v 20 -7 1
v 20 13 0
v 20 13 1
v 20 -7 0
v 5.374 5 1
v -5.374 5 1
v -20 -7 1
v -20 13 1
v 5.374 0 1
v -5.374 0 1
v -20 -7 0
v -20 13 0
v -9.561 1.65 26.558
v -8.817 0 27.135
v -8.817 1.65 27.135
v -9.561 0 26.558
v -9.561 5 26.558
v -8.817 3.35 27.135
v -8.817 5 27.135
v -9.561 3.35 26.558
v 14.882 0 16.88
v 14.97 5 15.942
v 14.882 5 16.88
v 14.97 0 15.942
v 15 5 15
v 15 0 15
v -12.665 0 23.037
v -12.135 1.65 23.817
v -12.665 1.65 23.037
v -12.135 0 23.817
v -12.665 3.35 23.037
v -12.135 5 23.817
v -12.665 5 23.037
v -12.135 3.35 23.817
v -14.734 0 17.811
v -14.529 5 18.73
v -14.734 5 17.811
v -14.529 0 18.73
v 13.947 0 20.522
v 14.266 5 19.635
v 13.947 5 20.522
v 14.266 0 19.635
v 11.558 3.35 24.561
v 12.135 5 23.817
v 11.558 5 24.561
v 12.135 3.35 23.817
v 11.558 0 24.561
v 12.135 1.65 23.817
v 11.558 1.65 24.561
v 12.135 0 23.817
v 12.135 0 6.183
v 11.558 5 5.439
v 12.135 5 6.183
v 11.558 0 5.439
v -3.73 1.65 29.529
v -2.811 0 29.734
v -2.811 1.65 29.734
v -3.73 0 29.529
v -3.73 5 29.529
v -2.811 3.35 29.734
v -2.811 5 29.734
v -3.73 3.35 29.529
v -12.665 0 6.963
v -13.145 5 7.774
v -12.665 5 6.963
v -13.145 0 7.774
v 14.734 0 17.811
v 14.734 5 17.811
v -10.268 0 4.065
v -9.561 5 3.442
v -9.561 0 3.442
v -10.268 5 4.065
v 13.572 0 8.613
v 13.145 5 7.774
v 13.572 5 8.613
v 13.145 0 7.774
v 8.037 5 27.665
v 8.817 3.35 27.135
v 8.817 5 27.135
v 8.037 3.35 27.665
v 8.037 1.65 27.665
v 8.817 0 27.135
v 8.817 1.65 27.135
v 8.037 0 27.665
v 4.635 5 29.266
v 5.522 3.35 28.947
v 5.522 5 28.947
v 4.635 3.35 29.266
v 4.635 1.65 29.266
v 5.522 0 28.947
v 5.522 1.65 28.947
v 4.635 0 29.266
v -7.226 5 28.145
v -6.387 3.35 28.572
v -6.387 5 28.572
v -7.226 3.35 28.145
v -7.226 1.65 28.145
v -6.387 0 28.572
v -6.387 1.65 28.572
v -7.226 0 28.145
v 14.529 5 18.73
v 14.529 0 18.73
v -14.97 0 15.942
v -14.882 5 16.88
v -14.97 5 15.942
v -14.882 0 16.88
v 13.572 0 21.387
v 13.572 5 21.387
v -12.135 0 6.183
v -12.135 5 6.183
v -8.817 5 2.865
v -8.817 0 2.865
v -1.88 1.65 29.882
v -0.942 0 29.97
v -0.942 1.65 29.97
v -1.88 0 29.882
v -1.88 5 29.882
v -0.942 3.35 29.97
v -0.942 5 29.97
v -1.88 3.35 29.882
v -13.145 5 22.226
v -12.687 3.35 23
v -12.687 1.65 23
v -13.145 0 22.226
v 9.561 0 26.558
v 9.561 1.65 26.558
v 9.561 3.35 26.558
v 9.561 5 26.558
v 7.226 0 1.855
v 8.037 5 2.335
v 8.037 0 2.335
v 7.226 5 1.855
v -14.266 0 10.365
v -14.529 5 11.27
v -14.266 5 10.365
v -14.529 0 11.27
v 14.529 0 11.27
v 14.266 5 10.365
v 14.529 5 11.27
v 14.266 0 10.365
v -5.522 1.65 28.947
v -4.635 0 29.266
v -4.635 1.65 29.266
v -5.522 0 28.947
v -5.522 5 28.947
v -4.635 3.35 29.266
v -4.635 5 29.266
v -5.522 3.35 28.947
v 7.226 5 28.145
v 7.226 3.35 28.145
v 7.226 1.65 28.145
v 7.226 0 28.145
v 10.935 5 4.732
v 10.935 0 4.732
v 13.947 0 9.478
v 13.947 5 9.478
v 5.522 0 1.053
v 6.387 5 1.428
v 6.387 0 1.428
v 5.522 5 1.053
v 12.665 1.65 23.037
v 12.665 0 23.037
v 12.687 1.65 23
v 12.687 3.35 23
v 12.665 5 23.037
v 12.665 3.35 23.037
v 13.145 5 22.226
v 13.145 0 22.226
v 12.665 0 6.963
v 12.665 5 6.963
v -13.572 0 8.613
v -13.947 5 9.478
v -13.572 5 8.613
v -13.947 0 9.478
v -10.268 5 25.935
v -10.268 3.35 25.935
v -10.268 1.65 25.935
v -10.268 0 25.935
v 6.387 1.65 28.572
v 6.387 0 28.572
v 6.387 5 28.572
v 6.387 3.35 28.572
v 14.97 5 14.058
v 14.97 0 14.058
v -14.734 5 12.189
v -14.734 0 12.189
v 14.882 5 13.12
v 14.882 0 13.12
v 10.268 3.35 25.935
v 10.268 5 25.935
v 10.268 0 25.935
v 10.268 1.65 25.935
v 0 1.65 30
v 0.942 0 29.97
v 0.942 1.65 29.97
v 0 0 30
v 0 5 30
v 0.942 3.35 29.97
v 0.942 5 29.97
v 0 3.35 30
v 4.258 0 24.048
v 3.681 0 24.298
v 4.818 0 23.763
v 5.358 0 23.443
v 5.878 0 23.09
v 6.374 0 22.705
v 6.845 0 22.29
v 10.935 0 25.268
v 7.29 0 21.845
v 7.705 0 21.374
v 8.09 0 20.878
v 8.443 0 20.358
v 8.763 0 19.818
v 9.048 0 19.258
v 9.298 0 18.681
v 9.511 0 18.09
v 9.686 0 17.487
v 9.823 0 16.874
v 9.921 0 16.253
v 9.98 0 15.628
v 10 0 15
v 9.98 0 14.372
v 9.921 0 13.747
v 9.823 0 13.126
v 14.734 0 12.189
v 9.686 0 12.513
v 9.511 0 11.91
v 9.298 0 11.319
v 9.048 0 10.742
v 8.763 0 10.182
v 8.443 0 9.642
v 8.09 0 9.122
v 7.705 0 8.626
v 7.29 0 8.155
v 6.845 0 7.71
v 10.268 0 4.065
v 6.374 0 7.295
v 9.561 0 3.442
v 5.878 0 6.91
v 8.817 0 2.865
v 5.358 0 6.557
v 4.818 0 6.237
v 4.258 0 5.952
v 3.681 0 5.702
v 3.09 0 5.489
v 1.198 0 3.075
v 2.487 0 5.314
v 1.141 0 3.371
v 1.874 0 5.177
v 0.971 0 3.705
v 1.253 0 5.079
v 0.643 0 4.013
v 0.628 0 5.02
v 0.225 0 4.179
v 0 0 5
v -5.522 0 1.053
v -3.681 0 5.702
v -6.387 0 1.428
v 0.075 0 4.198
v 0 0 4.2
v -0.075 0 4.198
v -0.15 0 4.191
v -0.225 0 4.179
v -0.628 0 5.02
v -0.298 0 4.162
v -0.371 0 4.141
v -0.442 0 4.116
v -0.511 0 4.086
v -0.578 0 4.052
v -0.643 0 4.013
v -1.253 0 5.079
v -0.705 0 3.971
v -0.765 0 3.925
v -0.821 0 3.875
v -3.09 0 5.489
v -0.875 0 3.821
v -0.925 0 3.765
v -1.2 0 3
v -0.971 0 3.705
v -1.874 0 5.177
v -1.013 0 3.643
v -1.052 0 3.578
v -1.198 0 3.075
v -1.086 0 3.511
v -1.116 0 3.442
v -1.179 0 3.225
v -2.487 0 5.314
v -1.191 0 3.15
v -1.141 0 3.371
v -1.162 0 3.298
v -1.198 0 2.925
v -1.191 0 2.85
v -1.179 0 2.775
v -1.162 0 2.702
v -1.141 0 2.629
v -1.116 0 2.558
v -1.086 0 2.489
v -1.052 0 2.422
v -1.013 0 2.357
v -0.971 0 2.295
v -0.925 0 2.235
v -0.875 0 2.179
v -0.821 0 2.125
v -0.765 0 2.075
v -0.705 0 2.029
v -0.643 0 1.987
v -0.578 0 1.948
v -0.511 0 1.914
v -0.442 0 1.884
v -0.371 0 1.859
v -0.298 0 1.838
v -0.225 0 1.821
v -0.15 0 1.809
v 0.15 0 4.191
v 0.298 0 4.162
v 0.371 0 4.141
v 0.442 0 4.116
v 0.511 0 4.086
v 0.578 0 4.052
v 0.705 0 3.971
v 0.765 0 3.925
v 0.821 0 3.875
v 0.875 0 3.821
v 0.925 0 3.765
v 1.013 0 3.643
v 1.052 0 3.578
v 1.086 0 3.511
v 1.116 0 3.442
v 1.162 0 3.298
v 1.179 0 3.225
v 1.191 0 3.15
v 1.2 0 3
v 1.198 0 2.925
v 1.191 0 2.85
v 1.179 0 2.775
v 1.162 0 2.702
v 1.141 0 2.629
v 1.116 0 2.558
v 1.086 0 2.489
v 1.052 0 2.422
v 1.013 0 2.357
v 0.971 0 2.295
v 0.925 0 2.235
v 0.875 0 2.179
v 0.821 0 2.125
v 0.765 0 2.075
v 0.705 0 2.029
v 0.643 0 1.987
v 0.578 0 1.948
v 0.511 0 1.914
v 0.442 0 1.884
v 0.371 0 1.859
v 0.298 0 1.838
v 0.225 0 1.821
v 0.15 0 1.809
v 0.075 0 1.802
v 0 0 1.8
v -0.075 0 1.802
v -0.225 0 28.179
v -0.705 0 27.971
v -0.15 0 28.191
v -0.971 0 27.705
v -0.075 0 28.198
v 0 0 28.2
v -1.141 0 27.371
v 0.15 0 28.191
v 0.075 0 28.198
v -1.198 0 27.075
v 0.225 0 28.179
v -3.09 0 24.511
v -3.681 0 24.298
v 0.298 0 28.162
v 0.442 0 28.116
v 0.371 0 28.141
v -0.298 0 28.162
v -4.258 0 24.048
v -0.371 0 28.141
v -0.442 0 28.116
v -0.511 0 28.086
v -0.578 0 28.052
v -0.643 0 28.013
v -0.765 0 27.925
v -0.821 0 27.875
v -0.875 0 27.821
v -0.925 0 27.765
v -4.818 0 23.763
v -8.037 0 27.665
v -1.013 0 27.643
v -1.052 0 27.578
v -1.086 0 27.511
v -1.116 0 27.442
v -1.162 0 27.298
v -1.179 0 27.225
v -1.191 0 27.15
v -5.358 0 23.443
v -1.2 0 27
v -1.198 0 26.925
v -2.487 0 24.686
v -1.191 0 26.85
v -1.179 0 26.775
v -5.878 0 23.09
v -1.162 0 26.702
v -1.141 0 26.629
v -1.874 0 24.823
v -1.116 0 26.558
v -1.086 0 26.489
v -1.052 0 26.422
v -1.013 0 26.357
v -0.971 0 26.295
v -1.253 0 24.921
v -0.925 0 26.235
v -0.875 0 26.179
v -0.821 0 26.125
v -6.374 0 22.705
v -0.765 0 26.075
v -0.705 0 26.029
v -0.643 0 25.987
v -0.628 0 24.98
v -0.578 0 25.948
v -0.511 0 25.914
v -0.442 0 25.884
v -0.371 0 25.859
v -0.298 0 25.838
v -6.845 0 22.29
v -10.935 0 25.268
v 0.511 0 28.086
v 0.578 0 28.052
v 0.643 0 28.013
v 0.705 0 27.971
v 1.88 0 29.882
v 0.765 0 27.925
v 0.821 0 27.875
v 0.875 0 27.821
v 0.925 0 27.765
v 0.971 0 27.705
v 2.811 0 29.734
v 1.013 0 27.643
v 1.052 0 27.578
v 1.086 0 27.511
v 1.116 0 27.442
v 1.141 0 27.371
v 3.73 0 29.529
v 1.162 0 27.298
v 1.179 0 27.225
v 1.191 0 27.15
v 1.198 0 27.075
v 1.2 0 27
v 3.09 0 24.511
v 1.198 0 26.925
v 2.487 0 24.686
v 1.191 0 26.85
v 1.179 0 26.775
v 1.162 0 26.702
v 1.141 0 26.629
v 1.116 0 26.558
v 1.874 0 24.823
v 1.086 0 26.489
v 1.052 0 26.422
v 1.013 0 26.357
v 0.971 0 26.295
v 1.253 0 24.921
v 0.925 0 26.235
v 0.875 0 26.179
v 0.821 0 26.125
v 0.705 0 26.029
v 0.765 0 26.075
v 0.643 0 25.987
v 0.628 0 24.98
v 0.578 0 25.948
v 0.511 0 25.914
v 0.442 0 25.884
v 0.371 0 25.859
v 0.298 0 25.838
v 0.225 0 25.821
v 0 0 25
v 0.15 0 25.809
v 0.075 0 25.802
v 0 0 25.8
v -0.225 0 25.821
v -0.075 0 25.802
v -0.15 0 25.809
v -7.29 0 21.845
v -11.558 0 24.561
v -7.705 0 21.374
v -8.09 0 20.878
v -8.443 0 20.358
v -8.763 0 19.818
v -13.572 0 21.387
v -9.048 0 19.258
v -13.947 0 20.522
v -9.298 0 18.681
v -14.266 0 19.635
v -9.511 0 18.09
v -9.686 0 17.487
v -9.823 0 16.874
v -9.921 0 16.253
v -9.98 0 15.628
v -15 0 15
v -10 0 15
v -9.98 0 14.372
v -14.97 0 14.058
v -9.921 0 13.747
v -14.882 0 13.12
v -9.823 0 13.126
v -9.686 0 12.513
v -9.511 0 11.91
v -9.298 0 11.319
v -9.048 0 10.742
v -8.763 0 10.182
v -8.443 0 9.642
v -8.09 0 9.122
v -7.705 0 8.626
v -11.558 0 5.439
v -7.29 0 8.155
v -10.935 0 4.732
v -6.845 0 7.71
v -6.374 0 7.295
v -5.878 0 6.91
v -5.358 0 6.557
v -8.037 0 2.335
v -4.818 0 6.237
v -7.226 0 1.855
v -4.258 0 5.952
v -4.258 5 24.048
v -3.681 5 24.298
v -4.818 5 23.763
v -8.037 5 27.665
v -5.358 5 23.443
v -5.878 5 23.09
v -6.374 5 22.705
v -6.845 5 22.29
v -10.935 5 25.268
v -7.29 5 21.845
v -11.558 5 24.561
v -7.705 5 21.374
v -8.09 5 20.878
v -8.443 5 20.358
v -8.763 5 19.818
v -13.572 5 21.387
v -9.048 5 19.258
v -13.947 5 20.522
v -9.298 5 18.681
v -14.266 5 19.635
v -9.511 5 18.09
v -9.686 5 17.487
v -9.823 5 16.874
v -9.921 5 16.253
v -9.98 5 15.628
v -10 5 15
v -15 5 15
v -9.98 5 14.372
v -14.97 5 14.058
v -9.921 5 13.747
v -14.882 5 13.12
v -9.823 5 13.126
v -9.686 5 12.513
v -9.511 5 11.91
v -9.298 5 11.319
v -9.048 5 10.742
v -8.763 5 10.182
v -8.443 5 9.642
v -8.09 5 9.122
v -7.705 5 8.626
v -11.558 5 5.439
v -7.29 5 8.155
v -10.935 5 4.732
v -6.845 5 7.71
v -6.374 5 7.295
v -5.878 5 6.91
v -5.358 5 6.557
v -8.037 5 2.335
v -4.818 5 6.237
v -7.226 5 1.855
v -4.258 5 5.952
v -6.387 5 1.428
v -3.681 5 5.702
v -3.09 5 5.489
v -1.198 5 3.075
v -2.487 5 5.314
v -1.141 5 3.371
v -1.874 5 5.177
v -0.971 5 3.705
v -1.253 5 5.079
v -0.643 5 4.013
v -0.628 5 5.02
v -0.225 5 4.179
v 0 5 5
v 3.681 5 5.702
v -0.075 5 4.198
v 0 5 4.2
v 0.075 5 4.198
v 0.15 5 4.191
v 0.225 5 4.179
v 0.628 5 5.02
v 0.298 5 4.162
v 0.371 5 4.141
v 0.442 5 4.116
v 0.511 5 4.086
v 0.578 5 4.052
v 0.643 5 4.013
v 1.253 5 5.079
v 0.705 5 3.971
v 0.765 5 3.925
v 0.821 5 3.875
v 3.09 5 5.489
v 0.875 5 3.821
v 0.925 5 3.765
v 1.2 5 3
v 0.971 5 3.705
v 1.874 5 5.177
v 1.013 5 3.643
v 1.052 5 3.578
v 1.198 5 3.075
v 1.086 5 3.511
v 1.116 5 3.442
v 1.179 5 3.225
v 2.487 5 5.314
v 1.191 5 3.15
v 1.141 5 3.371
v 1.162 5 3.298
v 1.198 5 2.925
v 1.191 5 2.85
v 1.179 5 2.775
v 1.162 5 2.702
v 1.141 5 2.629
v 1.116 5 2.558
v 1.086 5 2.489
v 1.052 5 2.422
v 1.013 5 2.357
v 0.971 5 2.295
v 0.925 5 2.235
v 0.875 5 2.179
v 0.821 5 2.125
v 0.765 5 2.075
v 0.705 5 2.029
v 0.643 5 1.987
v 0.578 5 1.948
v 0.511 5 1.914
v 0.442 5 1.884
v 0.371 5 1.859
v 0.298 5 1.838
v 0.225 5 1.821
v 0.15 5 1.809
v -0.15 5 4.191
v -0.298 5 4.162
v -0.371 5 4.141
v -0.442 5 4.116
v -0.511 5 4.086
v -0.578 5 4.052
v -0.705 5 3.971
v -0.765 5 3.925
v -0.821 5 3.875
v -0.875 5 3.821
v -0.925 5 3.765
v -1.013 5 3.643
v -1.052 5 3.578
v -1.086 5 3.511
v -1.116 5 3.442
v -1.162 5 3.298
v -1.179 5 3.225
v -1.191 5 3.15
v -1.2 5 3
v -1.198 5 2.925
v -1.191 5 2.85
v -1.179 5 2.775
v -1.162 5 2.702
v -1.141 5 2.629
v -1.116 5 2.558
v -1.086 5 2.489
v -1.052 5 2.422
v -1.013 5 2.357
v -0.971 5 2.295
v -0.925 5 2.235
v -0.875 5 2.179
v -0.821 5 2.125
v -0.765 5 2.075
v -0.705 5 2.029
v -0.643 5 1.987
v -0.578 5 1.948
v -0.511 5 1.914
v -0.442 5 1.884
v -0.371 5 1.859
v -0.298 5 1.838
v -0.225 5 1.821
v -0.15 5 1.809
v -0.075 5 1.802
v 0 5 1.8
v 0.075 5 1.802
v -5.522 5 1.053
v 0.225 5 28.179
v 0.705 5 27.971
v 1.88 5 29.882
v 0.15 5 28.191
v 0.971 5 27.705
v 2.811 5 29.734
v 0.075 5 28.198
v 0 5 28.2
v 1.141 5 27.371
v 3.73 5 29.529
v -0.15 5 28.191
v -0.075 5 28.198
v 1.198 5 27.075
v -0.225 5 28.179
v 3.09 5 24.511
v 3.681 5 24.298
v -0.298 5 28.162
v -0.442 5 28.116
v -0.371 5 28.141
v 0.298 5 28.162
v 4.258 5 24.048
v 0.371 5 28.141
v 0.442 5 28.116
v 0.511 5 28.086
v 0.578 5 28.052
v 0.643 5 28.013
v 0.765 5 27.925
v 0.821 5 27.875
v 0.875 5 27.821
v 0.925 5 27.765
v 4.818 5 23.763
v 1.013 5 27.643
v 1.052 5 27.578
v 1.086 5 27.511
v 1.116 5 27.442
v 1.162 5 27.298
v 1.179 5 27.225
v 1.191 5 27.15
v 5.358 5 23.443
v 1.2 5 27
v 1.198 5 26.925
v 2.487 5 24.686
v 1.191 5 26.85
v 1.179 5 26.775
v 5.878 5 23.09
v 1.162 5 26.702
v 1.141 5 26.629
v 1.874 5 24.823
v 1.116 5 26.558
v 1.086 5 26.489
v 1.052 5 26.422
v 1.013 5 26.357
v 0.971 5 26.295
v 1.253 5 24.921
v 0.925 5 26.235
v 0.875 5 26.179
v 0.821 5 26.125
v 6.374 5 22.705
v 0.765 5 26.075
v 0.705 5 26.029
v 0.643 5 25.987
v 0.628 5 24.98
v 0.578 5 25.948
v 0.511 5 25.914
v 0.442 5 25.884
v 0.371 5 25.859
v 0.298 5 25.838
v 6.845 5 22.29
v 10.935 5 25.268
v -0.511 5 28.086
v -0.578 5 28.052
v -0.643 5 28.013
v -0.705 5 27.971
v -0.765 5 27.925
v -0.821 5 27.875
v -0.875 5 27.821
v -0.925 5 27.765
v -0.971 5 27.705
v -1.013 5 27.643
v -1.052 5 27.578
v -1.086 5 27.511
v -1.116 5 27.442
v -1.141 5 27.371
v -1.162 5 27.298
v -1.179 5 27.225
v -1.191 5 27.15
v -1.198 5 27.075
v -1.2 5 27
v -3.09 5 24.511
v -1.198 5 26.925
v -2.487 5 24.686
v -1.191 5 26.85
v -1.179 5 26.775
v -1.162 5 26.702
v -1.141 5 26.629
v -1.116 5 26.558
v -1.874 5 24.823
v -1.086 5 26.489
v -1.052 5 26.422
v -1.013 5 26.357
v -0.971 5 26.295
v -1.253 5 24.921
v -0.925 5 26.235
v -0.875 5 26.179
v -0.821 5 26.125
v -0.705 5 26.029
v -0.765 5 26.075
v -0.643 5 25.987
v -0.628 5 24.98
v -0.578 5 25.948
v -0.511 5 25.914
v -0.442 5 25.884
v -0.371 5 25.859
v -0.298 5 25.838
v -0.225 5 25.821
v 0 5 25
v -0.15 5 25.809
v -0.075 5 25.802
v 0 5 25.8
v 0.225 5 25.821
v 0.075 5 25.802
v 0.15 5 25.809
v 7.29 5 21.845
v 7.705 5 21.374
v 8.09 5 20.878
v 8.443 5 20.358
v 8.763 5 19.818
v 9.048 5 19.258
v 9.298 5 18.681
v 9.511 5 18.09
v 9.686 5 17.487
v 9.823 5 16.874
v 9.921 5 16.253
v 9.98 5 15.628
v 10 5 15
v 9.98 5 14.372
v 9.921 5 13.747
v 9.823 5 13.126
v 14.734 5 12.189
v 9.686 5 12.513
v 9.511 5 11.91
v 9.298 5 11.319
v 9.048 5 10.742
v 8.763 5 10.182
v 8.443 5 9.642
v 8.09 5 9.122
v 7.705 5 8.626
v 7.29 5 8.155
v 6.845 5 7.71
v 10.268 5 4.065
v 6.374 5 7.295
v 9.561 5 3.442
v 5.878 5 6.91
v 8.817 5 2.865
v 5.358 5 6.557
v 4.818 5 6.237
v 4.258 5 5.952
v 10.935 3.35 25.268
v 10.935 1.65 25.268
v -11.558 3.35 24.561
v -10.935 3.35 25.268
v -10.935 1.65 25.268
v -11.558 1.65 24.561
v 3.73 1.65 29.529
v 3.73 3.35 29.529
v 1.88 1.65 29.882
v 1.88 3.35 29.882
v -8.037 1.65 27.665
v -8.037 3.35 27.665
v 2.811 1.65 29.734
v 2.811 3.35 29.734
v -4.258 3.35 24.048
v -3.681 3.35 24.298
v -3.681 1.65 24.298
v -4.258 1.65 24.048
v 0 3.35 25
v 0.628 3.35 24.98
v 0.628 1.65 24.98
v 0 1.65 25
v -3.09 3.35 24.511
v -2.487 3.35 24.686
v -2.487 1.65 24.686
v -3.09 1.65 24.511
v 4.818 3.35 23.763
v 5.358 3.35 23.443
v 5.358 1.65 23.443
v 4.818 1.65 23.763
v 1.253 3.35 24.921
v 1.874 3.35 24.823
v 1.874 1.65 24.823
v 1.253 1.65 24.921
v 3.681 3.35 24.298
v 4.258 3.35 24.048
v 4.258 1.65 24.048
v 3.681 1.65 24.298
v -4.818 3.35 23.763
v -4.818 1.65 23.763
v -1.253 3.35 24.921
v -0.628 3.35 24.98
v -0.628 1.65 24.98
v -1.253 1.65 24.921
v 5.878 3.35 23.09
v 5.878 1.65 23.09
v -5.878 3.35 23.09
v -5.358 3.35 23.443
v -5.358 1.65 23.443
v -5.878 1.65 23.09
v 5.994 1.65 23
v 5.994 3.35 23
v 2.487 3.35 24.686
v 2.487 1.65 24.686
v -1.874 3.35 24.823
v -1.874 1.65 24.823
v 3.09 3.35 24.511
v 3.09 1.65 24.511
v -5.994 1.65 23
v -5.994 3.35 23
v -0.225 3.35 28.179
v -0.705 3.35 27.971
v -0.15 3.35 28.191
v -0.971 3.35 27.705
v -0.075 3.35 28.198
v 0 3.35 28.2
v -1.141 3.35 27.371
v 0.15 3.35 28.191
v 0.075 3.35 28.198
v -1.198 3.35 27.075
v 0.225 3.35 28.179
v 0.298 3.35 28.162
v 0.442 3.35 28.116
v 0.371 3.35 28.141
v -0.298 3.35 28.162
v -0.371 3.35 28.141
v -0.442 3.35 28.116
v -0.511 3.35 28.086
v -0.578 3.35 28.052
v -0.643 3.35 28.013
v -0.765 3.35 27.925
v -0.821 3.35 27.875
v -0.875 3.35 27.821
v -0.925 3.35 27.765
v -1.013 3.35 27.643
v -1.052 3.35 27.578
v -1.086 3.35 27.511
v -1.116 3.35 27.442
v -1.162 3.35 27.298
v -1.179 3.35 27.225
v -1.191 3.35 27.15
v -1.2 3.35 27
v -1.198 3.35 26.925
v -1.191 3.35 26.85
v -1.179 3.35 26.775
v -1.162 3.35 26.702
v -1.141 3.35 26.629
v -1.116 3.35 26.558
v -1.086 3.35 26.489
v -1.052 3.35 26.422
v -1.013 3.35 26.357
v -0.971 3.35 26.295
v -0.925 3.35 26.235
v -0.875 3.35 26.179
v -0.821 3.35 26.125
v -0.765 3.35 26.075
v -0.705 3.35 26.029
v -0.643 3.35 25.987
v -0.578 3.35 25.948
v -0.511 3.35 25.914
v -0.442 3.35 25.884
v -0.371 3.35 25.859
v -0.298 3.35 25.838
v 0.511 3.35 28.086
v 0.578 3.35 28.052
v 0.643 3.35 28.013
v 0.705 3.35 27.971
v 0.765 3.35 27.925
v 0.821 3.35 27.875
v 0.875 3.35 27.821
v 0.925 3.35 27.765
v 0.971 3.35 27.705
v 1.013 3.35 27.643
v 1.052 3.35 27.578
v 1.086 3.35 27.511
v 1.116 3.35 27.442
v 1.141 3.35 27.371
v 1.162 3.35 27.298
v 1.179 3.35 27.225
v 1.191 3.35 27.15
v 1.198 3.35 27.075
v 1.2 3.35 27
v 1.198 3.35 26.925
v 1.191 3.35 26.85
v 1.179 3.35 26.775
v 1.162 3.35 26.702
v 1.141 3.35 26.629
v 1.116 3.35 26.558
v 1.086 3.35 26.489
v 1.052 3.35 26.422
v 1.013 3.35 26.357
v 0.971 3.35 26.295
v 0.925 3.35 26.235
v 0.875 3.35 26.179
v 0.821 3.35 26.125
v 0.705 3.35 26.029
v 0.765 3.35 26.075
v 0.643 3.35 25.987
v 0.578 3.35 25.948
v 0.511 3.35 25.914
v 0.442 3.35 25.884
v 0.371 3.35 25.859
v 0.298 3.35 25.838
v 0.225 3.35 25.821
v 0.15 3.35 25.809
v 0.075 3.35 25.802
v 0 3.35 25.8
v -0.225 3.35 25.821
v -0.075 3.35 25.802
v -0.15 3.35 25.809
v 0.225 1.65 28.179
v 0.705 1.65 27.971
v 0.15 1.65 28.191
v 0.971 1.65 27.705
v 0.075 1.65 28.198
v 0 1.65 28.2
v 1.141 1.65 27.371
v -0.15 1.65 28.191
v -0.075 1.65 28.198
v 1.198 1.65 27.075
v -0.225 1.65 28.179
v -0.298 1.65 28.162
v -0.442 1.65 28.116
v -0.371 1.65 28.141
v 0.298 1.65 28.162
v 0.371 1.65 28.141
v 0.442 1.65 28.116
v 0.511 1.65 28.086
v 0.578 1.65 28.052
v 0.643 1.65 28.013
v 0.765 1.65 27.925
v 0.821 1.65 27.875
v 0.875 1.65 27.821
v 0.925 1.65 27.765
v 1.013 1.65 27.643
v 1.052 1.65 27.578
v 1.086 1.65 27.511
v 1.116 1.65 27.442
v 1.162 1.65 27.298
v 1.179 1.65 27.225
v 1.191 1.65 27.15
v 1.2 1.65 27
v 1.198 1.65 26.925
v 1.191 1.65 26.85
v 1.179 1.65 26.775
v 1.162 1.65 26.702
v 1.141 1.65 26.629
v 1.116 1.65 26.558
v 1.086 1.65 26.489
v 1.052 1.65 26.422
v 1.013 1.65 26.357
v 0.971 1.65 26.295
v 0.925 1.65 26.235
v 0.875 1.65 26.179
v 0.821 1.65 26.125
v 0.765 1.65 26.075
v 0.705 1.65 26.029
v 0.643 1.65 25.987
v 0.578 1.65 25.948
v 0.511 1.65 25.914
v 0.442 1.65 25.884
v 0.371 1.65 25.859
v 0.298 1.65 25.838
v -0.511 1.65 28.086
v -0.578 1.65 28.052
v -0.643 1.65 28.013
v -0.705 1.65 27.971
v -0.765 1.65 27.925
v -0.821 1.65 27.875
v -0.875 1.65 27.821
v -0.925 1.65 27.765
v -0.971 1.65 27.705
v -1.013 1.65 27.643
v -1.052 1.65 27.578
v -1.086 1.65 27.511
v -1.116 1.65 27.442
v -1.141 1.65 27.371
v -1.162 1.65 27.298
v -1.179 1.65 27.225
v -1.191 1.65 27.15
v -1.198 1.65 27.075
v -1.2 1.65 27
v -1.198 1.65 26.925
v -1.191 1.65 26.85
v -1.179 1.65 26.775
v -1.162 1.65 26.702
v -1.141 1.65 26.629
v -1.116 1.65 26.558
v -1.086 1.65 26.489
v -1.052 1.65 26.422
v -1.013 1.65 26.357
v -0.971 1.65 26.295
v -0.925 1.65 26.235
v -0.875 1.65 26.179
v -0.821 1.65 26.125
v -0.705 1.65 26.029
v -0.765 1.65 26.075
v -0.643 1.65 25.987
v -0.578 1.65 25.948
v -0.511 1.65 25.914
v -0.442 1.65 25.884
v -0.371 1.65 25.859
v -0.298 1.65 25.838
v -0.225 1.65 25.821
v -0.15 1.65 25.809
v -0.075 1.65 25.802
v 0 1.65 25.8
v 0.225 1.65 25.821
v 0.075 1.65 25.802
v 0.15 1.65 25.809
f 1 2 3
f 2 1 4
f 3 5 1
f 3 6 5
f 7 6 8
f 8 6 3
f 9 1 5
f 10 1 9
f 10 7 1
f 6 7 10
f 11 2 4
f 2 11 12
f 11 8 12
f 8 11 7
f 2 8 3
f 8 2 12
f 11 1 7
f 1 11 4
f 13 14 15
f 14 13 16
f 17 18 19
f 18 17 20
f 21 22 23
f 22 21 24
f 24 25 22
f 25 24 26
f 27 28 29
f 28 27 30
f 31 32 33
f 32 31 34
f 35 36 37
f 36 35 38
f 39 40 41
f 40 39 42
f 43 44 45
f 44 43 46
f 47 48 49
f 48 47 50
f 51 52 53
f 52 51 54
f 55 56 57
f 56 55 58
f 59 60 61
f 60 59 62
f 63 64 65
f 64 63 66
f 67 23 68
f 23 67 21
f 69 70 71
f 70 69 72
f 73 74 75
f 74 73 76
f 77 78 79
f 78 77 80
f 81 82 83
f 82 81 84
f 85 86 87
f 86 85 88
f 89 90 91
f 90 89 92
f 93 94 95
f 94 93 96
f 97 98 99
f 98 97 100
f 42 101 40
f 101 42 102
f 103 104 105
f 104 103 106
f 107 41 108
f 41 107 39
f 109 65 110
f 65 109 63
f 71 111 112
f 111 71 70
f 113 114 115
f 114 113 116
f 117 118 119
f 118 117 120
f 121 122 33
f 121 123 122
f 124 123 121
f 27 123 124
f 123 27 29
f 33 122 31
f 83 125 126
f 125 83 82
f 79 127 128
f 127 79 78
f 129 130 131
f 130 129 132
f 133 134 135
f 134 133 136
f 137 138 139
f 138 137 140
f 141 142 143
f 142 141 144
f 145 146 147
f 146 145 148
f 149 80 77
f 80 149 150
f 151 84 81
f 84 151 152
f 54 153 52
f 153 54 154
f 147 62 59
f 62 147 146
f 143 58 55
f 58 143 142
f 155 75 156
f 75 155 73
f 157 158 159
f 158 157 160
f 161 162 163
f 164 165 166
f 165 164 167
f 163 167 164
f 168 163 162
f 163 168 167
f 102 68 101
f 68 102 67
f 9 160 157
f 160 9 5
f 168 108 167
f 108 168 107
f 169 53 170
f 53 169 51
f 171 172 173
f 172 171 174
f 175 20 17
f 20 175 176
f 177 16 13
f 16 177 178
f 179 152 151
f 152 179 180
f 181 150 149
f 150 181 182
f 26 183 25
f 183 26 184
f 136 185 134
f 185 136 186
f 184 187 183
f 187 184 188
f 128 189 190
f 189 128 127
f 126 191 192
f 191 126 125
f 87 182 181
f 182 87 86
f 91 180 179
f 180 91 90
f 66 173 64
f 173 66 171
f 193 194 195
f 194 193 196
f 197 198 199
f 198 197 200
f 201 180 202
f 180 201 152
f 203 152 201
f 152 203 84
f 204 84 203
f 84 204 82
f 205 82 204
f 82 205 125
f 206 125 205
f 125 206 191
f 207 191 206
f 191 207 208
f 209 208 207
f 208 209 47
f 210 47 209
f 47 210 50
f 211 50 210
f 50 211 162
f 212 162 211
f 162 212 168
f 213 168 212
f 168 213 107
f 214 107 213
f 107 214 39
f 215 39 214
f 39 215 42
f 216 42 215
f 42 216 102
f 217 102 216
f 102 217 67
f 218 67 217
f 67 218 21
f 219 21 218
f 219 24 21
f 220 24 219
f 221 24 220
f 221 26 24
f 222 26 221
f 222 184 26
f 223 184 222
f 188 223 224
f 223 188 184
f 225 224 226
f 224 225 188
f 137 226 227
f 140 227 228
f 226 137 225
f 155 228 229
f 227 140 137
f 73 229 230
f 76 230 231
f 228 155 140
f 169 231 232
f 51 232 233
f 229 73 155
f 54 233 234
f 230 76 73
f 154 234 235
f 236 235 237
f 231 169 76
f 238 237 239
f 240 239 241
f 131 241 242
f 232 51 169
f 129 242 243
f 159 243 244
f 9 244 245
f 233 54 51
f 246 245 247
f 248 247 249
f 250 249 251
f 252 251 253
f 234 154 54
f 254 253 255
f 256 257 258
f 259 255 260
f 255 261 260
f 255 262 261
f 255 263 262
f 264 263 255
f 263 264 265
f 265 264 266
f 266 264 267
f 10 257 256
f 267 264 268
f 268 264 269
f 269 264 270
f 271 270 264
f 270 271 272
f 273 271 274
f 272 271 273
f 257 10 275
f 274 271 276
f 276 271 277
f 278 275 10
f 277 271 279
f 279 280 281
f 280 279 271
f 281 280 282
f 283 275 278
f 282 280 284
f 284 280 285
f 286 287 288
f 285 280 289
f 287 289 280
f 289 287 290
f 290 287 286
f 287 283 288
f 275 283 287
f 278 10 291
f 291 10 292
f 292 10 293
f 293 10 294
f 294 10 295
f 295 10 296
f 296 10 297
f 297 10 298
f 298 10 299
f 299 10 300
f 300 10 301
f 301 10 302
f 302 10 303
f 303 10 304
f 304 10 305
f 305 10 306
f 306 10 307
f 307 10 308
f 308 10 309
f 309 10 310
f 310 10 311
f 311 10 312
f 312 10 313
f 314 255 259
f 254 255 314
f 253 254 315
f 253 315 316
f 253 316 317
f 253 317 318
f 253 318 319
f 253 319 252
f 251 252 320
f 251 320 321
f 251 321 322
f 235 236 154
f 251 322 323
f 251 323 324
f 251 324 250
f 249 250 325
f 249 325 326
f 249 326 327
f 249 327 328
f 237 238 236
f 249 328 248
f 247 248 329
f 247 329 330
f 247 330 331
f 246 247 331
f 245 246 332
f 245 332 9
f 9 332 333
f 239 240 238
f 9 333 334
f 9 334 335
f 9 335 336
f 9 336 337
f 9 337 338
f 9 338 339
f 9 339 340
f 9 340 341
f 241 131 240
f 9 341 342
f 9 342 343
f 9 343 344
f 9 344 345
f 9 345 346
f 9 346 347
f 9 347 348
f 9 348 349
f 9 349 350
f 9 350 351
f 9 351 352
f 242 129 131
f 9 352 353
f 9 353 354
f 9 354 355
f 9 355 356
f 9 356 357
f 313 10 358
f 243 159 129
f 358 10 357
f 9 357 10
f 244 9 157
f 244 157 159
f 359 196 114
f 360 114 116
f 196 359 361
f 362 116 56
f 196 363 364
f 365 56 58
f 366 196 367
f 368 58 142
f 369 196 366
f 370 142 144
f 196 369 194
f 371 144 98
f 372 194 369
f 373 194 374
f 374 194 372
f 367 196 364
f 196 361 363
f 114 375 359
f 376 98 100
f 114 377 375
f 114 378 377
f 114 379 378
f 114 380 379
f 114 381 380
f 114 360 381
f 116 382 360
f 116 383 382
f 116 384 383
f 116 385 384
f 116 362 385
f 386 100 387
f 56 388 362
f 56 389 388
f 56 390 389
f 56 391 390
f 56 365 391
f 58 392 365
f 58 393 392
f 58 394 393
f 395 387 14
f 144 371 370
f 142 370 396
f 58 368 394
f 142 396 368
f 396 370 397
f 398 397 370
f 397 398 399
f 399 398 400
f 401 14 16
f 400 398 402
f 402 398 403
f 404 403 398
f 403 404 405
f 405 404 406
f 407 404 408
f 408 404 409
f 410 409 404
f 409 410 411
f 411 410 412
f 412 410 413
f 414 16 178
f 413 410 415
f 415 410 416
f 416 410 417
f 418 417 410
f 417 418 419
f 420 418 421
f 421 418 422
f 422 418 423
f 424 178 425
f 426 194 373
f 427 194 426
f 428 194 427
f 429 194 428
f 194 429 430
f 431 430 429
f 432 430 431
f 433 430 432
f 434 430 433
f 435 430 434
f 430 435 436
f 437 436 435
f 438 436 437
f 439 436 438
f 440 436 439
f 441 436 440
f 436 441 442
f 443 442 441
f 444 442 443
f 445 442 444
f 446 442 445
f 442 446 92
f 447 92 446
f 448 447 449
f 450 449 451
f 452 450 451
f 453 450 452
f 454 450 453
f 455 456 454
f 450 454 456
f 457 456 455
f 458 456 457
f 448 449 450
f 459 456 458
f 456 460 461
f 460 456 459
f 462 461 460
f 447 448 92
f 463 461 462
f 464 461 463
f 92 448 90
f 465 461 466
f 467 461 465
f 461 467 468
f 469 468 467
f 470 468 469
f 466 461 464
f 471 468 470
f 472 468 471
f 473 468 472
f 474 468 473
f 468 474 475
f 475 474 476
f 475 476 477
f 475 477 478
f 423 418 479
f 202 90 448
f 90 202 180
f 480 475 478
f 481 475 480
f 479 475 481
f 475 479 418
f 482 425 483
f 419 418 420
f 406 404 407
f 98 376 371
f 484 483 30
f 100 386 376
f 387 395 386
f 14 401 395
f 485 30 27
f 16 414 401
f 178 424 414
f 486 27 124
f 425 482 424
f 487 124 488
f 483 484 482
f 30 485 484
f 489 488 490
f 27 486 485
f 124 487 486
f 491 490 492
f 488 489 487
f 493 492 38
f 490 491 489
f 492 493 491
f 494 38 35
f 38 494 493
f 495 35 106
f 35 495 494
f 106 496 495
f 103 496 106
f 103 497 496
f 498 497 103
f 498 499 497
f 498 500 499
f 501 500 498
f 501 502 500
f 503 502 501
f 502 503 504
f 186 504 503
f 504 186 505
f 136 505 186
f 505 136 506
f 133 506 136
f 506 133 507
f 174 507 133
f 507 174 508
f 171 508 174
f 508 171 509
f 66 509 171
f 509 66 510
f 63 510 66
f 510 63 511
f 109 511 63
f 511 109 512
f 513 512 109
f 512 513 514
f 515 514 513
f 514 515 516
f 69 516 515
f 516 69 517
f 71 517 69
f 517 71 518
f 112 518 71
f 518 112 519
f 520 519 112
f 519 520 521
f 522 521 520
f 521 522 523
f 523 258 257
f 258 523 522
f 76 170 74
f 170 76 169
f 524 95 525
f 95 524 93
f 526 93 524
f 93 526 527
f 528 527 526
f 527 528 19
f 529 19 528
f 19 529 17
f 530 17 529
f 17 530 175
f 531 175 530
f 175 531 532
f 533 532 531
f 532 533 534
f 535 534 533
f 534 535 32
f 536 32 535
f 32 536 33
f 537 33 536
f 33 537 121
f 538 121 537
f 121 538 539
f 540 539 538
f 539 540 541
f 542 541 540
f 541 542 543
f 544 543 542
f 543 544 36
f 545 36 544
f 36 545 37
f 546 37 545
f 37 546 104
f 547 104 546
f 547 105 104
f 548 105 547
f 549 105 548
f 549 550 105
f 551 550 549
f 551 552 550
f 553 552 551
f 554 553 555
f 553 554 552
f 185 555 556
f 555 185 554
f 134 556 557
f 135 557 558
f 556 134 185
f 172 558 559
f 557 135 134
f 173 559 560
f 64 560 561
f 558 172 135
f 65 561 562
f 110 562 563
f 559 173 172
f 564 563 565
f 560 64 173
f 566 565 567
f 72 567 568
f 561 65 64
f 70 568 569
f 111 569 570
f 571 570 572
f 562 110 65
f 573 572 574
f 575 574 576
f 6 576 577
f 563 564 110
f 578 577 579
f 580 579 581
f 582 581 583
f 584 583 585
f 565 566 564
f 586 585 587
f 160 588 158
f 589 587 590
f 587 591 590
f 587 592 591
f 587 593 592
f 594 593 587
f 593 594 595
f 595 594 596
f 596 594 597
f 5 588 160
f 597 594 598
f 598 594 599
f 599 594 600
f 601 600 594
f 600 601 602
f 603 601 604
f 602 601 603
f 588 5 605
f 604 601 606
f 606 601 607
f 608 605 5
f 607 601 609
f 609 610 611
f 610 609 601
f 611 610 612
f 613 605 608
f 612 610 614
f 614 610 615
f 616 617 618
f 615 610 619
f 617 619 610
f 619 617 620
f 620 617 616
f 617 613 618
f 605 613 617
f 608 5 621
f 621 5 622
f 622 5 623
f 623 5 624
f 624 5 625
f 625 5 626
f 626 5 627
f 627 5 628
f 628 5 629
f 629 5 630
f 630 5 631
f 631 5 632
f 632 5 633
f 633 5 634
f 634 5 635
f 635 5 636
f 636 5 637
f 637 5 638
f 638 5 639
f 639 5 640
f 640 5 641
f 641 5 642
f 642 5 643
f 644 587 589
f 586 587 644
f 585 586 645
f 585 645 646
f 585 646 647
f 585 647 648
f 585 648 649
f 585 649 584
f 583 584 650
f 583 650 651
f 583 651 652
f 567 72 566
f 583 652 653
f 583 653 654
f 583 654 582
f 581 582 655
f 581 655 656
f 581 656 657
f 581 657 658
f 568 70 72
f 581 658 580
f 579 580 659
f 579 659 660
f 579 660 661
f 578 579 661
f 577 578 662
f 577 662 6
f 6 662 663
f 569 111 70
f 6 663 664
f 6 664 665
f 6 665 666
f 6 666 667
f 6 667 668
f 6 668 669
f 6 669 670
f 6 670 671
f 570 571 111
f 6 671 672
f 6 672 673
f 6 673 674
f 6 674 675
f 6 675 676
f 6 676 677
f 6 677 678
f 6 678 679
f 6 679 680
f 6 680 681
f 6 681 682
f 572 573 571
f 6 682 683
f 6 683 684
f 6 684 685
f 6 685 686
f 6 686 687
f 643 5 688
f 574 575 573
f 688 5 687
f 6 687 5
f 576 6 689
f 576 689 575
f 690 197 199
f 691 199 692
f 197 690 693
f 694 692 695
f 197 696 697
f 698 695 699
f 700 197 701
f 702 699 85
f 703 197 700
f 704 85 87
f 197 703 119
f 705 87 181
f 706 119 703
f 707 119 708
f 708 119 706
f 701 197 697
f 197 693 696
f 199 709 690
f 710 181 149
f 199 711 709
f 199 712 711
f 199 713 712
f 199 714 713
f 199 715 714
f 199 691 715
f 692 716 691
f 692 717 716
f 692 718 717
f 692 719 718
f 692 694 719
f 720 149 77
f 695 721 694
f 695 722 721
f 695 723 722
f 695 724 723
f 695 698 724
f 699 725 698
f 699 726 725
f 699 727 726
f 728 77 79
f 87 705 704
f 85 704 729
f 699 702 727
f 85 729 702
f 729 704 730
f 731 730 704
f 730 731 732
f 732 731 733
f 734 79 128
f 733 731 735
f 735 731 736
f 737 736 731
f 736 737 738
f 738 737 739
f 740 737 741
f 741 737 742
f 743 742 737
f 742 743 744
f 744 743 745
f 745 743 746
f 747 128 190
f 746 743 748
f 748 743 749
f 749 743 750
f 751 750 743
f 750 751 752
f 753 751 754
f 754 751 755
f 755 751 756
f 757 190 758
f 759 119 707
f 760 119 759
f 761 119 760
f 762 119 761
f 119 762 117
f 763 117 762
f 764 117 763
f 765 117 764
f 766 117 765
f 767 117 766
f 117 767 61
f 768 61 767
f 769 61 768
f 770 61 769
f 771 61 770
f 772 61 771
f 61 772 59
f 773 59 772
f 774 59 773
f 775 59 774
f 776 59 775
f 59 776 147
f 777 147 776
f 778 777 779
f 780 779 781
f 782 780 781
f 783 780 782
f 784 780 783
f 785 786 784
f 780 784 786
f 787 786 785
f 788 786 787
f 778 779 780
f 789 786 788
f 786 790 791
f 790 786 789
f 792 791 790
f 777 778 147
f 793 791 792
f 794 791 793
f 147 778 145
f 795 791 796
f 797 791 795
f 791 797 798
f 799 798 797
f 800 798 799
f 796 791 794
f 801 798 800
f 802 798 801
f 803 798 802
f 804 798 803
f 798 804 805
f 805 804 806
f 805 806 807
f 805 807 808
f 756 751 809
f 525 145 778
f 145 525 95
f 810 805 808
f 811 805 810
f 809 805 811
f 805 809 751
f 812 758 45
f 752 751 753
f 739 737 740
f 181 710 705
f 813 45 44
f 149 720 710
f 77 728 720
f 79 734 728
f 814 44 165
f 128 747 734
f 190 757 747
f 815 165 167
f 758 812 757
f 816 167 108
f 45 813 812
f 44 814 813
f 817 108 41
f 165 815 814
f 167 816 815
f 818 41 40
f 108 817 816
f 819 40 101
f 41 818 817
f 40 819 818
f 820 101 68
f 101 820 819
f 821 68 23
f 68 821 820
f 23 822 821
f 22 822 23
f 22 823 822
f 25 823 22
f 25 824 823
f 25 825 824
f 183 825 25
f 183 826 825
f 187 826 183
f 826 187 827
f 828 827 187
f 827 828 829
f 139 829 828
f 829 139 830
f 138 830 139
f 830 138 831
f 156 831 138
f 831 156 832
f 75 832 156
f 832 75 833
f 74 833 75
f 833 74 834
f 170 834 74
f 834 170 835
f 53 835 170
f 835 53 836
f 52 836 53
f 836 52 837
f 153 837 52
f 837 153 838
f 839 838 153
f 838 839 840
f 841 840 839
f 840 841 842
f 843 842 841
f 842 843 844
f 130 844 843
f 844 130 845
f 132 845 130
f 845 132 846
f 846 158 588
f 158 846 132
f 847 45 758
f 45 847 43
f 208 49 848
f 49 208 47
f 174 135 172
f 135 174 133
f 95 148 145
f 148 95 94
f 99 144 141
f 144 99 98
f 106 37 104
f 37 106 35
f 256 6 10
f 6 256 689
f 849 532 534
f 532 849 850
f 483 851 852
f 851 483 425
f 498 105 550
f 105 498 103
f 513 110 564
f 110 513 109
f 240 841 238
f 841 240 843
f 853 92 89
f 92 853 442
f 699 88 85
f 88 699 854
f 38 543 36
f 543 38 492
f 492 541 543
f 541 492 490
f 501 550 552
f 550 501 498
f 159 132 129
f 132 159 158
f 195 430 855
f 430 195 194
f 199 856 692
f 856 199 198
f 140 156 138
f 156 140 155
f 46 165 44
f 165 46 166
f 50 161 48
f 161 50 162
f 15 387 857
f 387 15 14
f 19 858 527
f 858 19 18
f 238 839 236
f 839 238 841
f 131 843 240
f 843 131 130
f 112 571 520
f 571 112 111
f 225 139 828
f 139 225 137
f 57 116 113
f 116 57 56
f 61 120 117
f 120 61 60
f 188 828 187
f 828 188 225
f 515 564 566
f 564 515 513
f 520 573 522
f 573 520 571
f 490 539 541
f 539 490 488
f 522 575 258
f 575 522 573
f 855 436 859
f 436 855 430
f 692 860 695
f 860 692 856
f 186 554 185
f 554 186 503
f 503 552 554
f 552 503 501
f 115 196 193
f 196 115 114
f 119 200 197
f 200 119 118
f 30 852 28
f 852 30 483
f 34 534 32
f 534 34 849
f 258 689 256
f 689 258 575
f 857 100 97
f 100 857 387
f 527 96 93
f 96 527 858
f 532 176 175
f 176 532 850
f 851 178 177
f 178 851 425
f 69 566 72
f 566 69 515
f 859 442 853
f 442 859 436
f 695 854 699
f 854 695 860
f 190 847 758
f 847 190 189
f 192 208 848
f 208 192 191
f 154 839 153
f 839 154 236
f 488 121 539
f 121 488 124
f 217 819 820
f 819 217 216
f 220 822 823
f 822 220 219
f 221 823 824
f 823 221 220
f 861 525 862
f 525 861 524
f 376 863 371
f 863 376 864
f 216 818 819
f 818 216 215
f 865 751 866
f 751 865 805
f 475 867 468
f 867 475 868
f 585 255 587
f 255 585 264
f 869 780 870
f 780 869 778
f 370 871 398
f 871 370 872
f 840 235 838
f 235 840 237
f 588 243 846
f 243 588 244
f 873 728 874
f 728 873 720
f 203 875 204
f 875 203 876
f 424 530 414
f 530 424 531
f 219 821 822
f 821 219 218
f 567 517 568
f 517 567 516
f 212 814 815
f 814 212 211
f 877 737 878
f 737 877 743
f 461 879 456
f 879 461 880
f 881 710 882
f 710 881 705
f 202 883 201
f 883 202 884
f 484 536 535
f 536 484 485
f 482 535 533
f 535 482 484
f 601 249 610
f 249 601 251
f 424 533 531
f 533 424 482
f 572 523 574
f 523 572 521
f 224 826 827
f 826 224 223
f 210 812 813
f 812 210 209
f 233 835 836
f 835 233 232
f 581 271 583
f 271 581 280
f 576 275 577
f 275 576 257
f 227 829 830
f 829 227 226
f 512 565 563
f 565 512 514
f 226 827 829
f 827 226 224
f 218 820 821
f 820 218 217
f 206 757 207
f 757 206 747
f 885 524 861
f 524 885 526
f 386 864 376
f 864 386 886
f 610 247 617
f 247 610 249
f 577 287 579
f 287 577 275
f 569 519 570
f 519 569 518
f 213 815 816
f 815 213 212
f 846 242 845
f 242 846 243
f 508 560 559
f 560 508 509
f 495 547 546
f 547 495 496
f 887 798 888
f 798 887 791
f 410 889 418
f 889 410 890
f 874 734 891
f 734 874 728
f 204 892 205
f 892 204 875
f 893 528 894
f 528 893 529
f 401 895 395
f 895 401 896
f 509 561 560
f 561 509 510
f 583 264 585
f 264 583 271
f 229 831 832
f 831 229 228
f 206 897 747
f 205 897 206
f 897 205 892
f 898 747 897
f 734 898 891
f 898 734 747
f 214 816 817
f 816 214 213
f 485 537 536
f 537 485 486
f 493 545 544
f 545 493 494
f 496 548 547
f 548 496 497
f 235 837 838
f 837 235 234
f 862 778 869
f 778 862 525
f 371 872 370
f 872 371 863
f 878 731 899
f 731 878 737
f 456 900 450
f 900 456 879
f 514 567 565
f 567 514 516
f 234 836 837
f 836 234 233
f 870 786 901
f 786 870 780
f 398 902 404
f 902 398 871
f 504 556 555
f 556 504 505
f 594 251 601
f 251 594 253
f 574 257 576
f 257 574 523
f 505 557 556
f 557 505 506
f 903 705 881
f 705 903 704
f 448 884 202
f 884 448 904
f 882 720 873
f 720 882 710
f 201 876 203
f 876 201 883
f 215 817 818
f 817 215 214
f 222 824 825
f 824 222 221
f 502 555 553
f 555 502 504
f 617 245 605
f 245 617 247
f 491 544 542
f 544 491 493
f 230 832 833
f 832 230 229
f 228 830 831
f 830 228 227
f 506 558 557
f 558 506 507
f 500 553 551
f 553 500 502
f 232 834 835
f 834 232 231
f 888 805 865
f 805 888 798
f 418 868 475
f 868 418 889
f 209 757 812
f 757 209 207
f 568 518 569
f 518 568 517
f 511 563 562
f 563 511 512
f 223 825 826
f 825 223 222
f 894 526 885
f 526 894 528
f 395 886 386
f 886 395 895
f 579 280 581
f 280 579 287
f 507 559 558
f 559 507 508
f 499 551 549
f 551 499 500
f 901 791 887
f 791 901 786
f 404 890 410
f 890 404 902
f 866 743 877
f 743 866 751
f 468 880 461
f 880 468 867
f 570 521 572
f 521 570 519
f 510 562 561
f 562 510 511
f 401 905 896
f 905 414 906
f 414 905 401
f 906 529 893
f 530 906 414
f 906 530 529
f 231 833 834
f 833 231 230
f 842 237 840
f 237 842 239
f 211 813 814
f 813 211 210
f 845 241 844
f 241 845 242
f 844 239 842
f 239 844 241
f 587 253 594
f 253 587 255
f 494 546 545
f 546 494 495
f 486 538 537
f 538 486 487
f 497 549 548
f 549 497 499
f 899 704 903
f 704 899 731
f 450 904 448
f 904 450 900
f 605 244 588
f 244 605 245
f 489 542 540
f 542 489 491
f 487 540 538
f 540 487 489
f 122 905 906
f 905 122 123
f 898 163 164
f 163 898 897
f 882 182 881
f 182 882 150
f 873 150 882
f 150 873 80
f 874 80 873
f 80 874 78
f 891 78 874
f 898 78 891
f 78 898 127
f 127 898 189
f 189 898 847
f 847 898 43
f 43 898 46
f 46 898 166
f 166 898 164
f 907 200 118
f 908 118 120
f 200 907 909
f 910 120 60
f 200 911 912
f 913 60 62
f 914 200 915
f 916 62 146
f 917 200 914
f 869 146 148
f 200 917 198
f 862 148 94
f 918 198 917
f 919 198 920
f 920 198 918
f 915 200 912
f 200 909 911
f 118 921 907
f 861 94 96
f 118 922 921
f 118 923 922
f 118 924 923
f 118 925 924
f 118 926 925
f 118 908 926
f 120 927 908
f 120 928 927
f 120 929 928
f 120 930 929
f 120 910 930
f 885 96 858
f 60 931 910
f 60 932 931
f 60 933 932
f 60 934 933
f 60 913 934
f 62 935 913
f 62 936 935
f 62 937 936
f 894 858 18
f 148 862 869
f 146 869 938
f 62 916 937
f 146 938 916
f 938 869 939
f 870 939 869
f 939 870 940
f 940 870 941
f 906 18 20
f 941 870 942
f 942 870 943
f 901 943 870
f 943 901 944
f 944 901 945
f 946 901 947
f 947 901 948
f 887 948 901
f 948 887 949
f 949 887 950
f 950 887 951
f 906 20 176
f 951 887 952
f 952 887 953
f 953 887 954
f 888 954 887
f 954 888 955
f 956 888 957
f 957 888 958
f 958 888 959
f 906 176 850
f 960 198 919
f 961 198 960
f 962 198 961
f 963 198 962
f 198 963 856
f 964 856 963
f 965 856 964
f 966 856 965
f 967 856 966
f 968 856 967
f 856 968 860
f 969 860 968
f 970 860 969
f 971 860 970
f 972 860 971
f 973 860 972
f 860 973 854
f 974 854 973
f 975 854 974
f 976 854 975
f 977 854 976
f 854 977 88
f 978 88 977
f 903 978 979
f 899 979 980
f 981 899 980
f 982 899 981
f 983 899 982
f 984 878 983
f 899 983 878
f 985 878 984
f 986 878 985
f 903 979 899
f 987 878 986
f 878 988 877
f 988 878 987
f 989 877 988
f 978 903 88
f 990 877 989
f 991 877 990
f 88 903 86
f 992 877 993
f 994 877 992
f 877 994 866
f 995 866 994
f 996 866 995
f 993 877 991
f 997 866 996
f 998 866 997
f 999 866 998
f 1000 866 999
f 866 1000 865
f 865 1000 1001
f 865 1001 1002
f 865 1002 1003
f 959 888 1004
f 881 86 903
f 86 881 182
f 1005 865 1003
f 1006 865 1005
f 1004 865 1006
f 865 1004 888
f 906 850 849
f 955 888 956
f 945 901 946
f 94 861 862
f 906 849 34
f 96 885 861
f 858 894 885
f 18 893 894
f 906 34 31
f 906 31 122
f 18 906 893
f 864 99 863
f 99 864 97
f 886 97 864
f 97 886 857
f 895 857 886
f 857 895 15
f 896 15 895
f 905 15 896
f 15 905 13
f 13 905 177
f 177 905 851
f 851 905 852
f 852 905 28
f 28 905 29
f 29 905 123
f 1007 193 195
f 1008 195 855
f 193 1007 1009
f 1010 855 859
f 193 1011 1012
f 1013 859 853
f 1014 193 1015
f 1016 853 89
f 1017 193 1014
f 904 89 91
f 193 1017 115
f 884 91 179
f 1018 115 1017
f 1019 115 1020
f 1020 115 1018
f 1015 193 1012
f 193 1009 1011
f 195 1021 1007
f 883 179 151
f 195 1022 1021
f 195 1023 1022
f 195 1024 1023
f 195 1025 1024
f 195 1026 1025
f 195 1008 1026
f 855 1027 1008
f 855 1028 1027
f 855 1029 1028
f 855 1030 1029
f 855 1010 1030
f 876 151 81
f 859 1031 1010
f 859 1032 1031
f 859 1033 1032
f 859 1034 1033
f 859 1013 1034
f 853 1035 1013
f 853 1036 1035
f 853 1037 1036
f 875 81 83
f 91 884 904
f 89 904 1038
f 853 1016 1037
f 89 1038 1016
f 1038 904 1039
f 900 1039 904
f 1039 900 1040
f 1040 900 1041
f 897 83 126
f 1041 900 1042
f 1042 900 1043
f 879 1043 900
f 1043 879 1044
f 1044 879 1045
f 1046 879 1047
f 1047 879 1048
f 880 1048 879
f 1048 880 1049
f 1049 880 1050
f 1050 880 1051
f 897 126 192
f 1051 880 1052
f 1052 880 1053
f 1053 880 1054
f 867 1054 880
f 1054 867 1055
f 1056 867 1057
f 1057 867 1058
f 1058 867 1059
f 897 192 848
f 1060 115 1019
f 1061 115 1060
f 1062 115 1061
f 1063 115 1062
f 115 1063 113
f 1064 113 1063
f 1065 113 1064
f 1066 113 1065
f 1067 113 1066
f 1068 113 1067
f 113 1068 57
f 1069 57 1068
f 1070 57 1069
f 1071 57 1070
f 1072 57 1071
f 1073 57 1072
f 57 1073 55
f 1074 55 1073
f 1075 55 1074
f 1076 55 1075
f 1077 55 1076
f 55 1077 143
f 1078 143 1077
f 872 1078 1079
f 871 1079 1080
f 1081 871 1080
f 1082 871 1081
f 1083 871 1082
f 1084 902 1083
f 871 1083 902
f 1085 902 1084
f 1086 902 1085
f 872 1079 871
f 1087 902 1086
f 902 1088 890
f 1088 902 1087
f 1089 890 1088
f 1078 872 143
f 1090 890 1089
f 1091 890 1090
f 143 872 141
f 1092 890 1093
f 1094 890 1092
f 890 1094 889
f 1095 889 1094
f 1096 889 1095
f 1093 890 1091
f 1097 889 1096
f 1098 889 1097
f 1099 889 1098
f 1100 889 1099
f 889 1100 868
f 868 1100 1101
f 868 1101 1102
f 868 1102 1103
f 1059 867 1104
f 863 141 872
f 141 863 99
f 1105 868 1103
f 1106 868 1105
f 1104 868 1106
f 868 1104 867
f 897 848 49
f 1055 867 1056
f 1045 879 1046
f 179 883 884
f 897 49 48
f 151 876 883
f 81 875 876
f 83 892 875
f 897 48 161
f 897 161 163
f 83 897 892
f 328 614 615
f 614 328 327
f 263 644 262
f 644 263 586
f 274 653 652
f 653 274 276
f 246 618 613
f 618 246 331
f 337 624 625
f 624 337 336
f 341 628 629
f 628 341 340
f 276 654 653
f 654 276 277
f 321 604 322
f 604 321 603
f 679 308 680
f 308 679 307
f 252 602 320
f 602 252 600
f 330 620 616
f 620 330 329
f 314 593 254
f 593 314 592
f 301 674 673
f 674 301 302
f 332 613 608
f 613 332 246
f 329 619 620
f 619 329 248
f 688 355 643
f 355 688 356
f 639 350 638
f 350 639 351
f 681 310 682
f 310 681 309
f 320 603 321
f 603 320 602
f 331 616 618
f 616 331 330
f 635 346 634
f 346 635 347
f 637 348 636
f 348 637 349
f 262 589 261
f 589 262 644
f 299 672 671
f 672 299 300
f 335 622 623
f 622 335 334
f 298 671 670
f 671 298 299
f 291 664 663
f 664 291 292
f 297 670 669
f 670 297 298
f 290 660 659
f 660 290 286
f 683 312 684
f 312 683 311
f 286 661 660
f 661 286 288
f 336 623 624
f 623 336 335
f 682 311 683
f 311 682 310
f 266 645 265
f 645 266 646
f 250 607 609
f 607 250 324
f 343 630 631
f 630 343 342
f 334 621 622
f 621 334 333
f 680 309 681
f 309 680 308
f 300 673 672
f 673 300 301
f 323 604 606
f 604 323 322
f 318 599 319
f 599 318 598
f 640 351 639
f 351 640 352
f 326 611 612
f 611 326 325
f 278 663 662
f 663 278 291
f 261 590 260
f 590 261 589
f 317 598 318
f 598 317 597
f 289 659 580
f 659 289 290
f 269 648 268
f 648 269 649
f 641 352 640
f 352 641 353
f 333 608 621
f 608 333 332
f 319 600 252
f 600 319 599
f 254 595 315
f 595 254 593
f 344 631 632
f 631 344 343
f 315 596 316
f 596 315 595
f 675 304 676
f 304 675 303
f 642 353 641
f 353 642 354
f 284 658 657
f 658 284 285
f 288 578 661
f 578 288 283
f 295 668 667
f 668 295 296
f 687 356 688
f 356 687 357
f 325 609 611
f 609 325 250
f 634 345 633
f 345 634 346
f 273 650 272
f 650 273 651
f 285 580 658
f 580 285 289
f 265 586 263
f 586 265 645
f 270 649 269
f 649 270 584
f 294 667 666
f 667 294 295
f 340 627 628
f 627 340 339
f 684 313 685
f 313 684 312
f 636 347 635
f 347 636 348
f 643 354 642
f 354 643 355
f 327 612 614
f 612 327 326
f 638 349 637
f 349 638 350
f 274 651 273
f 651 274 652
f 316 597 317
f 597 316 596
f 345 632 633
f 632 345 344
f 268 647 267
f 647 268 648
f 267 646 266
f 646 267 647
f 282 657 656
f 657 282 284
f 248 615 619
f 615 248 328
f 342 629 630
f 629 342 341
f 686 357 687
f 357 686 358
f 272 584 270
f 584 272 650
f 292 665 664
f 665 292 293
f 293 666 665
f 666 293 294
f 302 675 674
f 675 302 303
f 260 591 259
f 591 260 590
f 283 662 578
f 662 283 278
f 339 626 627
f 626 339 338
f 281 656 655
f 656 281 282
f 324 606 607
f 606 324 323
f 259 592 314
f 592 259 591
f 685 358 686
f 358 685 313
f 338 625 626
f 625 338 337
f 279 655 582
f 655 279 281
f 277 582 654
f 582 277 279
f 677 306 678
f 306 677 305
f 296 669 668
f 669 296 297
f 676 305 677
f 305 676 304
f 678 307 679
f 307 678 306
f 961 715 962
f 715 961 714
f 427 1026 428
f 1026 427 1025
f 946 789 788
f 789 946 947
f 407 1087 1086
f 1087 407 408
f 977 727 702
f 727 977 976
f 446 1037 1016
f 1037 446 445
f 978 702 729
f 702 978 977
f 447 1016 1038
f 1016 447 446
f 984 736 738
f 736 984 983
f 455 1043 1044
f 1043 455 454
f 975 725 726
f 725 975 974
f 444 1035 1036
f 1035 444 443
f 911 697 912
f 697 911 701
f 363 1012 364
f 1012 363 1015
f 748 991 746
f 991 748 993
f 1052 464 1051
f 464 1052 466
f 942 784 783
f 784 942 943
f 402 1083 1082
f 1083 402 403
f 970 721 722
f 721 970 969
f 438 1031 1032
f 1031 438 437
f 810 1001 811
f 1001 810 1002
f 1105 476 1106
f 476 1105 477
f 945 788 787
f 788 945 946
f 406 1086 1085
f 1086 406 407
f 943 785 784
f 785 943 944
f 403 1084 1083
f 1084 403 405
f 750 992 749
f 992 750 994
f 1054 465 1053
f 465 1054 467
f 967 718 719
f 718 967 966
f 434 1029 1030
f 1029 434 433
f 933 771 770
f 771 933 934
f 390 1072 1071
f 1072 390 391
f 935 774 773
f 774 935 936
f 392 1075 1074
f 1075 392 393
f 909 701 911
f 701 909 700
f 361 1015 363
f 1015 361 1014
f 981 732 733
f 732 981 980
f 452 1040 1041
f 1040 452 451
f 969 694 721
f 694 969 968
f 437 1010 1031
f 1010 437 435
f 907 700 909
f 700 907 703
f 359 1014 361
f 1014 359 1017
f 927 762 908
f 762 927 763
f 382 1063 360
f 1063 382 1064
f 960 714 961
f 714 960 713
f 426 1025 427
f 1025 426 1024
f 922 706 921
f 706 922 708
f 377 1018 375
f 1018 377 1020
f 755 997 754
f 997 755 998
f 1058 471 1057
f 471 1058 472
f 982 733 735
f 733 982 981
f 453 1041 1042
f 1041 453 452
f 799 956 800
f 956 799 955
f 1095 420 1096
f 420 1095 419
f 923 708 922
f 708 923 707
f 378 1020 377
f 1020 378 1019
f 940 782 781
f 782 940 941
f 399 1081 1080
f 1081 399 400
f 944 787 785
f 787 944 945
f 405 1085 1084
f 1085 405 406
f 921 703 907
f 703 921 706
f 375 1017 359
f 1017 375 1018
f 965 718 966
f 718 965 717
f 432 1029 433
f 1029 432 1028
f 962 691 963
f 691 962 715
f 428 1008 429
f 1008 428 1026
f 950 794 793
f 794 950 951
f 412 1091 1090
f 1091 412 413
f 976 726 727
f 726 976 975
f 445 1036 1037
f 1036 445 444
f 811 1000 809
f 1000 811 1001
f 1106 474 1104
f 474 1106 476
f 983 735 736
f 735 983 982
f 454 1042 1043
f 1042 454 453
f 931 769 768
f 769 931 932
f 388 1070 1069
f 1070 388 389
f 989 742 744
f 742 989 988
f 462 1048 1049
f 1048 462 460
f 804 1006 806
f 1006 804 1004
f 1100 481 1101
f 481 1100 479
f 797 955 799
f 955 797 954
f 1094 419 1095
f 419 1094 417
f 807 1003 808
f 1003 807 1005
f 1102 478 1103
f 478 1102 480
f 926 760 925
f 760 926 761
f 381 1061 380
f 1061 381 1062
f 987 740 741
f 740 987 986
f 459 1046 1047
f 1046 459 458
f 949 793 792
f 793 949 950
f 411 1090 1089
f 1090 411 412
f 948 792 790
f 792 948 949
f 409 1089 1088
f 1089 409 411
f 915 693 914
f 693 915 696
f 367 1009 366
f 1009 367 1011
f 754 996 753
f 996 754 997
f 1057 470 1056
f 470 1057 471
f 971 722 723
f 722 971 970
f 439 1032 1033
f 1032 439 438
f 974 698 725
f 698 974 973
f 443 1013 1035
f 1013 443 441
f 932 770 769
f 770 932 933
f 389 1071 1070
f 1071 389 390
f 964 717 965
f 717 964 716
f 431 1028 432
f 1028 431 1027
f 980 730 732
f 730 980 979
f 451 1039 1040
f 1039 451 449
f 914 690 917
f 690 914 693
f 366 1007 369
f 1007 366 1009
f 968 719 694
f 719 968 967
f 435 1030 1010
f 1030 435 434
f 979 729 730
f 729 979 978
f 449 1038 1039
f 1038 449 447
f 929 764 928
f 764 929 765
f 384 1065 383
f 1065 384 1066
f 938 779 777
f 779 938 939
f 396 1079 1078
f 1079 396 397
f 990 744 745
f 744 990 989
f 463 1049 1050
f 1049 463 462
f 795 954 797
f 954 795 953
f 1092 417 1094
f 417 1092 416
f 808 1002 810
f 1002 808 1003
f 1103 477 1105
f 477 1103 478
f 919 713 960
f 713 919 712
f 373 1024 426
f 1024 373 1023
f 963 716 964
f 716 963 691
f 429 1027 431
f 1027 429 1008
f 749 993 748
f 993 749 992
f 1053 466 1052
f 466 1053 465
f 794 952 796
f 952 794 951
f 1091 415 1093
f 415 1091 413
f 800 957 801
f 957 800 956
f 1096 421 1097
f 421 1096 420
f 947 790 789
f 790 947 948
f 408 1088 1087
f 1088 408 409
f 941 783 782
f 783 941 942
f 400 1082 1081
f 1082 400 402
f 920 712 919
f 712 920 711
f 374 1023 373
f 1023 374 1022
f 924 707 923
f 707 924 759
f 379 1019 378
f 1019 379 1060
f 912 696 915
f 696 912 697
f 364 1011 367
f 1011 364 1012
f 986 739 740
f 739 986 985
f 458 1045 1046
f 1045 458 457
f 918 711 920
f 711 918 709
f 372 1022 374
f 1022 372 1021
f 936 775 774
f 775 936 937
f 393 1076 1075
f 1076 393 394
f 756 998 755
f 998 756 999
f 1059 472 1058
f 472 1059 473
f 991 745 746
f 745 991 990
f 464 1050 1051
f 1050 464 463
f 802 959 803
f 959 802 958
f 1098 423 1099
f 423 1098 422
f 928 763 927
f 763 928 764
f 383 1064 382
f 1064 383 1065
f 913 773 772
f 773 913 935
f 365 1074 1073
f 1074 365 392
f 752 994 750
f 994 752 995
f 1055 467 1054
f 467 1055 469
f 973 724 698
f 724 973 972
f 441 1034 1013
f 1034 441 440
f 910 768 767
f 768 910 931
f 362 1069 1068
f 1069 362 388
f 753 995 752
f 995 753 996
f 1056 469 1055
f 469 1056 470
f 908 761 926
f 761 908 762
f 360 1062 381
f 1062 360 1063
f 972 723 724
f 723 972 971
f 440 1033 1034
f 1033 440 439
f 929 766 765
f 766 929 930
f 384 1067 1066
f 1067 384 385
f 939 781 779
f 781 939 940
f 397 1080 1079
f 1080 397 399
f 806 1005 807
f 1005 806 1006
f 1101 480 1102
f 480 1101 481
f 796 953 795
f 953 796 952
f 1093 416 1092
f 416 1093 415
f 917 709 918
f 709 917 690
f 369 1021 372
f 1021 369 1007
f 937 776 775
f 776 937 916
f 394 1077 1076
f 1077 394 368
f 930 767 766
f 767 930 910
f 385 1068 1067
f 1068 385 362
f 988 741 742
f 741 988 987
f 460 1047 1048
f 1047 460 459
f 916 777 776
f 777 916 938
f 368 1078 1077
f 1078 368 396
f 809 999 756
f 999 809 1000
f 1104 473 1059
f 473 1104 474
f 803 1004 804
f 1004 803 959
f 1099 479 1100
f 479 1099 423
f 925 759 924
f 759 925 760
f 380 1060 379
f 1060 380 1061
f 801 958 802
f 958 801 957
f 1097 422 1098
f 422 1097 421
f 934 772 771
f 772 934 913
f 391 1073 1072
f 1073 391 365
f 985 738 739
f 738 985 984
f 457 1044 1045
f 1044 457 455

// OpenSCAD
dikte_dunne_as = 1.65;
afstand_tussen_assen = 1.7;
dikte_dikke_as = 5;
totale_dikte = dikte_dunne_as*2+afstand_tussen_assen;

difference(){
	union(){


        translate([-20,-7,0]){
           cube([40,20,1], center=false);
        }        


        translate([0,5,15]){
            rotate([90,0,0]){
               cylinder(h=5, r=15, $fn=100, center=false);
            }
        }

        
	}
	union() {

        translate([0,6,15]){
            rotate([90,0,0]){
               cylinder(h=7, r=10, $fn=100, center=false);
            }
        }

        
        translate([-20,dikte_dunne_as,23]){
           cube([40,afstand_tussen_assen,8], center=false);
        }        
        
        translate([0,30,3]){
            rotate([90,0,0]){
                cylinder(h=50, r=1.2, $fn=100, center=false);
            }
        }

        translate([0,30,27]){
            rotate([90,0,0]){
                cylinder(h=50, r=1.2, $fn=100, center=false);
            }
        }



	}
}
